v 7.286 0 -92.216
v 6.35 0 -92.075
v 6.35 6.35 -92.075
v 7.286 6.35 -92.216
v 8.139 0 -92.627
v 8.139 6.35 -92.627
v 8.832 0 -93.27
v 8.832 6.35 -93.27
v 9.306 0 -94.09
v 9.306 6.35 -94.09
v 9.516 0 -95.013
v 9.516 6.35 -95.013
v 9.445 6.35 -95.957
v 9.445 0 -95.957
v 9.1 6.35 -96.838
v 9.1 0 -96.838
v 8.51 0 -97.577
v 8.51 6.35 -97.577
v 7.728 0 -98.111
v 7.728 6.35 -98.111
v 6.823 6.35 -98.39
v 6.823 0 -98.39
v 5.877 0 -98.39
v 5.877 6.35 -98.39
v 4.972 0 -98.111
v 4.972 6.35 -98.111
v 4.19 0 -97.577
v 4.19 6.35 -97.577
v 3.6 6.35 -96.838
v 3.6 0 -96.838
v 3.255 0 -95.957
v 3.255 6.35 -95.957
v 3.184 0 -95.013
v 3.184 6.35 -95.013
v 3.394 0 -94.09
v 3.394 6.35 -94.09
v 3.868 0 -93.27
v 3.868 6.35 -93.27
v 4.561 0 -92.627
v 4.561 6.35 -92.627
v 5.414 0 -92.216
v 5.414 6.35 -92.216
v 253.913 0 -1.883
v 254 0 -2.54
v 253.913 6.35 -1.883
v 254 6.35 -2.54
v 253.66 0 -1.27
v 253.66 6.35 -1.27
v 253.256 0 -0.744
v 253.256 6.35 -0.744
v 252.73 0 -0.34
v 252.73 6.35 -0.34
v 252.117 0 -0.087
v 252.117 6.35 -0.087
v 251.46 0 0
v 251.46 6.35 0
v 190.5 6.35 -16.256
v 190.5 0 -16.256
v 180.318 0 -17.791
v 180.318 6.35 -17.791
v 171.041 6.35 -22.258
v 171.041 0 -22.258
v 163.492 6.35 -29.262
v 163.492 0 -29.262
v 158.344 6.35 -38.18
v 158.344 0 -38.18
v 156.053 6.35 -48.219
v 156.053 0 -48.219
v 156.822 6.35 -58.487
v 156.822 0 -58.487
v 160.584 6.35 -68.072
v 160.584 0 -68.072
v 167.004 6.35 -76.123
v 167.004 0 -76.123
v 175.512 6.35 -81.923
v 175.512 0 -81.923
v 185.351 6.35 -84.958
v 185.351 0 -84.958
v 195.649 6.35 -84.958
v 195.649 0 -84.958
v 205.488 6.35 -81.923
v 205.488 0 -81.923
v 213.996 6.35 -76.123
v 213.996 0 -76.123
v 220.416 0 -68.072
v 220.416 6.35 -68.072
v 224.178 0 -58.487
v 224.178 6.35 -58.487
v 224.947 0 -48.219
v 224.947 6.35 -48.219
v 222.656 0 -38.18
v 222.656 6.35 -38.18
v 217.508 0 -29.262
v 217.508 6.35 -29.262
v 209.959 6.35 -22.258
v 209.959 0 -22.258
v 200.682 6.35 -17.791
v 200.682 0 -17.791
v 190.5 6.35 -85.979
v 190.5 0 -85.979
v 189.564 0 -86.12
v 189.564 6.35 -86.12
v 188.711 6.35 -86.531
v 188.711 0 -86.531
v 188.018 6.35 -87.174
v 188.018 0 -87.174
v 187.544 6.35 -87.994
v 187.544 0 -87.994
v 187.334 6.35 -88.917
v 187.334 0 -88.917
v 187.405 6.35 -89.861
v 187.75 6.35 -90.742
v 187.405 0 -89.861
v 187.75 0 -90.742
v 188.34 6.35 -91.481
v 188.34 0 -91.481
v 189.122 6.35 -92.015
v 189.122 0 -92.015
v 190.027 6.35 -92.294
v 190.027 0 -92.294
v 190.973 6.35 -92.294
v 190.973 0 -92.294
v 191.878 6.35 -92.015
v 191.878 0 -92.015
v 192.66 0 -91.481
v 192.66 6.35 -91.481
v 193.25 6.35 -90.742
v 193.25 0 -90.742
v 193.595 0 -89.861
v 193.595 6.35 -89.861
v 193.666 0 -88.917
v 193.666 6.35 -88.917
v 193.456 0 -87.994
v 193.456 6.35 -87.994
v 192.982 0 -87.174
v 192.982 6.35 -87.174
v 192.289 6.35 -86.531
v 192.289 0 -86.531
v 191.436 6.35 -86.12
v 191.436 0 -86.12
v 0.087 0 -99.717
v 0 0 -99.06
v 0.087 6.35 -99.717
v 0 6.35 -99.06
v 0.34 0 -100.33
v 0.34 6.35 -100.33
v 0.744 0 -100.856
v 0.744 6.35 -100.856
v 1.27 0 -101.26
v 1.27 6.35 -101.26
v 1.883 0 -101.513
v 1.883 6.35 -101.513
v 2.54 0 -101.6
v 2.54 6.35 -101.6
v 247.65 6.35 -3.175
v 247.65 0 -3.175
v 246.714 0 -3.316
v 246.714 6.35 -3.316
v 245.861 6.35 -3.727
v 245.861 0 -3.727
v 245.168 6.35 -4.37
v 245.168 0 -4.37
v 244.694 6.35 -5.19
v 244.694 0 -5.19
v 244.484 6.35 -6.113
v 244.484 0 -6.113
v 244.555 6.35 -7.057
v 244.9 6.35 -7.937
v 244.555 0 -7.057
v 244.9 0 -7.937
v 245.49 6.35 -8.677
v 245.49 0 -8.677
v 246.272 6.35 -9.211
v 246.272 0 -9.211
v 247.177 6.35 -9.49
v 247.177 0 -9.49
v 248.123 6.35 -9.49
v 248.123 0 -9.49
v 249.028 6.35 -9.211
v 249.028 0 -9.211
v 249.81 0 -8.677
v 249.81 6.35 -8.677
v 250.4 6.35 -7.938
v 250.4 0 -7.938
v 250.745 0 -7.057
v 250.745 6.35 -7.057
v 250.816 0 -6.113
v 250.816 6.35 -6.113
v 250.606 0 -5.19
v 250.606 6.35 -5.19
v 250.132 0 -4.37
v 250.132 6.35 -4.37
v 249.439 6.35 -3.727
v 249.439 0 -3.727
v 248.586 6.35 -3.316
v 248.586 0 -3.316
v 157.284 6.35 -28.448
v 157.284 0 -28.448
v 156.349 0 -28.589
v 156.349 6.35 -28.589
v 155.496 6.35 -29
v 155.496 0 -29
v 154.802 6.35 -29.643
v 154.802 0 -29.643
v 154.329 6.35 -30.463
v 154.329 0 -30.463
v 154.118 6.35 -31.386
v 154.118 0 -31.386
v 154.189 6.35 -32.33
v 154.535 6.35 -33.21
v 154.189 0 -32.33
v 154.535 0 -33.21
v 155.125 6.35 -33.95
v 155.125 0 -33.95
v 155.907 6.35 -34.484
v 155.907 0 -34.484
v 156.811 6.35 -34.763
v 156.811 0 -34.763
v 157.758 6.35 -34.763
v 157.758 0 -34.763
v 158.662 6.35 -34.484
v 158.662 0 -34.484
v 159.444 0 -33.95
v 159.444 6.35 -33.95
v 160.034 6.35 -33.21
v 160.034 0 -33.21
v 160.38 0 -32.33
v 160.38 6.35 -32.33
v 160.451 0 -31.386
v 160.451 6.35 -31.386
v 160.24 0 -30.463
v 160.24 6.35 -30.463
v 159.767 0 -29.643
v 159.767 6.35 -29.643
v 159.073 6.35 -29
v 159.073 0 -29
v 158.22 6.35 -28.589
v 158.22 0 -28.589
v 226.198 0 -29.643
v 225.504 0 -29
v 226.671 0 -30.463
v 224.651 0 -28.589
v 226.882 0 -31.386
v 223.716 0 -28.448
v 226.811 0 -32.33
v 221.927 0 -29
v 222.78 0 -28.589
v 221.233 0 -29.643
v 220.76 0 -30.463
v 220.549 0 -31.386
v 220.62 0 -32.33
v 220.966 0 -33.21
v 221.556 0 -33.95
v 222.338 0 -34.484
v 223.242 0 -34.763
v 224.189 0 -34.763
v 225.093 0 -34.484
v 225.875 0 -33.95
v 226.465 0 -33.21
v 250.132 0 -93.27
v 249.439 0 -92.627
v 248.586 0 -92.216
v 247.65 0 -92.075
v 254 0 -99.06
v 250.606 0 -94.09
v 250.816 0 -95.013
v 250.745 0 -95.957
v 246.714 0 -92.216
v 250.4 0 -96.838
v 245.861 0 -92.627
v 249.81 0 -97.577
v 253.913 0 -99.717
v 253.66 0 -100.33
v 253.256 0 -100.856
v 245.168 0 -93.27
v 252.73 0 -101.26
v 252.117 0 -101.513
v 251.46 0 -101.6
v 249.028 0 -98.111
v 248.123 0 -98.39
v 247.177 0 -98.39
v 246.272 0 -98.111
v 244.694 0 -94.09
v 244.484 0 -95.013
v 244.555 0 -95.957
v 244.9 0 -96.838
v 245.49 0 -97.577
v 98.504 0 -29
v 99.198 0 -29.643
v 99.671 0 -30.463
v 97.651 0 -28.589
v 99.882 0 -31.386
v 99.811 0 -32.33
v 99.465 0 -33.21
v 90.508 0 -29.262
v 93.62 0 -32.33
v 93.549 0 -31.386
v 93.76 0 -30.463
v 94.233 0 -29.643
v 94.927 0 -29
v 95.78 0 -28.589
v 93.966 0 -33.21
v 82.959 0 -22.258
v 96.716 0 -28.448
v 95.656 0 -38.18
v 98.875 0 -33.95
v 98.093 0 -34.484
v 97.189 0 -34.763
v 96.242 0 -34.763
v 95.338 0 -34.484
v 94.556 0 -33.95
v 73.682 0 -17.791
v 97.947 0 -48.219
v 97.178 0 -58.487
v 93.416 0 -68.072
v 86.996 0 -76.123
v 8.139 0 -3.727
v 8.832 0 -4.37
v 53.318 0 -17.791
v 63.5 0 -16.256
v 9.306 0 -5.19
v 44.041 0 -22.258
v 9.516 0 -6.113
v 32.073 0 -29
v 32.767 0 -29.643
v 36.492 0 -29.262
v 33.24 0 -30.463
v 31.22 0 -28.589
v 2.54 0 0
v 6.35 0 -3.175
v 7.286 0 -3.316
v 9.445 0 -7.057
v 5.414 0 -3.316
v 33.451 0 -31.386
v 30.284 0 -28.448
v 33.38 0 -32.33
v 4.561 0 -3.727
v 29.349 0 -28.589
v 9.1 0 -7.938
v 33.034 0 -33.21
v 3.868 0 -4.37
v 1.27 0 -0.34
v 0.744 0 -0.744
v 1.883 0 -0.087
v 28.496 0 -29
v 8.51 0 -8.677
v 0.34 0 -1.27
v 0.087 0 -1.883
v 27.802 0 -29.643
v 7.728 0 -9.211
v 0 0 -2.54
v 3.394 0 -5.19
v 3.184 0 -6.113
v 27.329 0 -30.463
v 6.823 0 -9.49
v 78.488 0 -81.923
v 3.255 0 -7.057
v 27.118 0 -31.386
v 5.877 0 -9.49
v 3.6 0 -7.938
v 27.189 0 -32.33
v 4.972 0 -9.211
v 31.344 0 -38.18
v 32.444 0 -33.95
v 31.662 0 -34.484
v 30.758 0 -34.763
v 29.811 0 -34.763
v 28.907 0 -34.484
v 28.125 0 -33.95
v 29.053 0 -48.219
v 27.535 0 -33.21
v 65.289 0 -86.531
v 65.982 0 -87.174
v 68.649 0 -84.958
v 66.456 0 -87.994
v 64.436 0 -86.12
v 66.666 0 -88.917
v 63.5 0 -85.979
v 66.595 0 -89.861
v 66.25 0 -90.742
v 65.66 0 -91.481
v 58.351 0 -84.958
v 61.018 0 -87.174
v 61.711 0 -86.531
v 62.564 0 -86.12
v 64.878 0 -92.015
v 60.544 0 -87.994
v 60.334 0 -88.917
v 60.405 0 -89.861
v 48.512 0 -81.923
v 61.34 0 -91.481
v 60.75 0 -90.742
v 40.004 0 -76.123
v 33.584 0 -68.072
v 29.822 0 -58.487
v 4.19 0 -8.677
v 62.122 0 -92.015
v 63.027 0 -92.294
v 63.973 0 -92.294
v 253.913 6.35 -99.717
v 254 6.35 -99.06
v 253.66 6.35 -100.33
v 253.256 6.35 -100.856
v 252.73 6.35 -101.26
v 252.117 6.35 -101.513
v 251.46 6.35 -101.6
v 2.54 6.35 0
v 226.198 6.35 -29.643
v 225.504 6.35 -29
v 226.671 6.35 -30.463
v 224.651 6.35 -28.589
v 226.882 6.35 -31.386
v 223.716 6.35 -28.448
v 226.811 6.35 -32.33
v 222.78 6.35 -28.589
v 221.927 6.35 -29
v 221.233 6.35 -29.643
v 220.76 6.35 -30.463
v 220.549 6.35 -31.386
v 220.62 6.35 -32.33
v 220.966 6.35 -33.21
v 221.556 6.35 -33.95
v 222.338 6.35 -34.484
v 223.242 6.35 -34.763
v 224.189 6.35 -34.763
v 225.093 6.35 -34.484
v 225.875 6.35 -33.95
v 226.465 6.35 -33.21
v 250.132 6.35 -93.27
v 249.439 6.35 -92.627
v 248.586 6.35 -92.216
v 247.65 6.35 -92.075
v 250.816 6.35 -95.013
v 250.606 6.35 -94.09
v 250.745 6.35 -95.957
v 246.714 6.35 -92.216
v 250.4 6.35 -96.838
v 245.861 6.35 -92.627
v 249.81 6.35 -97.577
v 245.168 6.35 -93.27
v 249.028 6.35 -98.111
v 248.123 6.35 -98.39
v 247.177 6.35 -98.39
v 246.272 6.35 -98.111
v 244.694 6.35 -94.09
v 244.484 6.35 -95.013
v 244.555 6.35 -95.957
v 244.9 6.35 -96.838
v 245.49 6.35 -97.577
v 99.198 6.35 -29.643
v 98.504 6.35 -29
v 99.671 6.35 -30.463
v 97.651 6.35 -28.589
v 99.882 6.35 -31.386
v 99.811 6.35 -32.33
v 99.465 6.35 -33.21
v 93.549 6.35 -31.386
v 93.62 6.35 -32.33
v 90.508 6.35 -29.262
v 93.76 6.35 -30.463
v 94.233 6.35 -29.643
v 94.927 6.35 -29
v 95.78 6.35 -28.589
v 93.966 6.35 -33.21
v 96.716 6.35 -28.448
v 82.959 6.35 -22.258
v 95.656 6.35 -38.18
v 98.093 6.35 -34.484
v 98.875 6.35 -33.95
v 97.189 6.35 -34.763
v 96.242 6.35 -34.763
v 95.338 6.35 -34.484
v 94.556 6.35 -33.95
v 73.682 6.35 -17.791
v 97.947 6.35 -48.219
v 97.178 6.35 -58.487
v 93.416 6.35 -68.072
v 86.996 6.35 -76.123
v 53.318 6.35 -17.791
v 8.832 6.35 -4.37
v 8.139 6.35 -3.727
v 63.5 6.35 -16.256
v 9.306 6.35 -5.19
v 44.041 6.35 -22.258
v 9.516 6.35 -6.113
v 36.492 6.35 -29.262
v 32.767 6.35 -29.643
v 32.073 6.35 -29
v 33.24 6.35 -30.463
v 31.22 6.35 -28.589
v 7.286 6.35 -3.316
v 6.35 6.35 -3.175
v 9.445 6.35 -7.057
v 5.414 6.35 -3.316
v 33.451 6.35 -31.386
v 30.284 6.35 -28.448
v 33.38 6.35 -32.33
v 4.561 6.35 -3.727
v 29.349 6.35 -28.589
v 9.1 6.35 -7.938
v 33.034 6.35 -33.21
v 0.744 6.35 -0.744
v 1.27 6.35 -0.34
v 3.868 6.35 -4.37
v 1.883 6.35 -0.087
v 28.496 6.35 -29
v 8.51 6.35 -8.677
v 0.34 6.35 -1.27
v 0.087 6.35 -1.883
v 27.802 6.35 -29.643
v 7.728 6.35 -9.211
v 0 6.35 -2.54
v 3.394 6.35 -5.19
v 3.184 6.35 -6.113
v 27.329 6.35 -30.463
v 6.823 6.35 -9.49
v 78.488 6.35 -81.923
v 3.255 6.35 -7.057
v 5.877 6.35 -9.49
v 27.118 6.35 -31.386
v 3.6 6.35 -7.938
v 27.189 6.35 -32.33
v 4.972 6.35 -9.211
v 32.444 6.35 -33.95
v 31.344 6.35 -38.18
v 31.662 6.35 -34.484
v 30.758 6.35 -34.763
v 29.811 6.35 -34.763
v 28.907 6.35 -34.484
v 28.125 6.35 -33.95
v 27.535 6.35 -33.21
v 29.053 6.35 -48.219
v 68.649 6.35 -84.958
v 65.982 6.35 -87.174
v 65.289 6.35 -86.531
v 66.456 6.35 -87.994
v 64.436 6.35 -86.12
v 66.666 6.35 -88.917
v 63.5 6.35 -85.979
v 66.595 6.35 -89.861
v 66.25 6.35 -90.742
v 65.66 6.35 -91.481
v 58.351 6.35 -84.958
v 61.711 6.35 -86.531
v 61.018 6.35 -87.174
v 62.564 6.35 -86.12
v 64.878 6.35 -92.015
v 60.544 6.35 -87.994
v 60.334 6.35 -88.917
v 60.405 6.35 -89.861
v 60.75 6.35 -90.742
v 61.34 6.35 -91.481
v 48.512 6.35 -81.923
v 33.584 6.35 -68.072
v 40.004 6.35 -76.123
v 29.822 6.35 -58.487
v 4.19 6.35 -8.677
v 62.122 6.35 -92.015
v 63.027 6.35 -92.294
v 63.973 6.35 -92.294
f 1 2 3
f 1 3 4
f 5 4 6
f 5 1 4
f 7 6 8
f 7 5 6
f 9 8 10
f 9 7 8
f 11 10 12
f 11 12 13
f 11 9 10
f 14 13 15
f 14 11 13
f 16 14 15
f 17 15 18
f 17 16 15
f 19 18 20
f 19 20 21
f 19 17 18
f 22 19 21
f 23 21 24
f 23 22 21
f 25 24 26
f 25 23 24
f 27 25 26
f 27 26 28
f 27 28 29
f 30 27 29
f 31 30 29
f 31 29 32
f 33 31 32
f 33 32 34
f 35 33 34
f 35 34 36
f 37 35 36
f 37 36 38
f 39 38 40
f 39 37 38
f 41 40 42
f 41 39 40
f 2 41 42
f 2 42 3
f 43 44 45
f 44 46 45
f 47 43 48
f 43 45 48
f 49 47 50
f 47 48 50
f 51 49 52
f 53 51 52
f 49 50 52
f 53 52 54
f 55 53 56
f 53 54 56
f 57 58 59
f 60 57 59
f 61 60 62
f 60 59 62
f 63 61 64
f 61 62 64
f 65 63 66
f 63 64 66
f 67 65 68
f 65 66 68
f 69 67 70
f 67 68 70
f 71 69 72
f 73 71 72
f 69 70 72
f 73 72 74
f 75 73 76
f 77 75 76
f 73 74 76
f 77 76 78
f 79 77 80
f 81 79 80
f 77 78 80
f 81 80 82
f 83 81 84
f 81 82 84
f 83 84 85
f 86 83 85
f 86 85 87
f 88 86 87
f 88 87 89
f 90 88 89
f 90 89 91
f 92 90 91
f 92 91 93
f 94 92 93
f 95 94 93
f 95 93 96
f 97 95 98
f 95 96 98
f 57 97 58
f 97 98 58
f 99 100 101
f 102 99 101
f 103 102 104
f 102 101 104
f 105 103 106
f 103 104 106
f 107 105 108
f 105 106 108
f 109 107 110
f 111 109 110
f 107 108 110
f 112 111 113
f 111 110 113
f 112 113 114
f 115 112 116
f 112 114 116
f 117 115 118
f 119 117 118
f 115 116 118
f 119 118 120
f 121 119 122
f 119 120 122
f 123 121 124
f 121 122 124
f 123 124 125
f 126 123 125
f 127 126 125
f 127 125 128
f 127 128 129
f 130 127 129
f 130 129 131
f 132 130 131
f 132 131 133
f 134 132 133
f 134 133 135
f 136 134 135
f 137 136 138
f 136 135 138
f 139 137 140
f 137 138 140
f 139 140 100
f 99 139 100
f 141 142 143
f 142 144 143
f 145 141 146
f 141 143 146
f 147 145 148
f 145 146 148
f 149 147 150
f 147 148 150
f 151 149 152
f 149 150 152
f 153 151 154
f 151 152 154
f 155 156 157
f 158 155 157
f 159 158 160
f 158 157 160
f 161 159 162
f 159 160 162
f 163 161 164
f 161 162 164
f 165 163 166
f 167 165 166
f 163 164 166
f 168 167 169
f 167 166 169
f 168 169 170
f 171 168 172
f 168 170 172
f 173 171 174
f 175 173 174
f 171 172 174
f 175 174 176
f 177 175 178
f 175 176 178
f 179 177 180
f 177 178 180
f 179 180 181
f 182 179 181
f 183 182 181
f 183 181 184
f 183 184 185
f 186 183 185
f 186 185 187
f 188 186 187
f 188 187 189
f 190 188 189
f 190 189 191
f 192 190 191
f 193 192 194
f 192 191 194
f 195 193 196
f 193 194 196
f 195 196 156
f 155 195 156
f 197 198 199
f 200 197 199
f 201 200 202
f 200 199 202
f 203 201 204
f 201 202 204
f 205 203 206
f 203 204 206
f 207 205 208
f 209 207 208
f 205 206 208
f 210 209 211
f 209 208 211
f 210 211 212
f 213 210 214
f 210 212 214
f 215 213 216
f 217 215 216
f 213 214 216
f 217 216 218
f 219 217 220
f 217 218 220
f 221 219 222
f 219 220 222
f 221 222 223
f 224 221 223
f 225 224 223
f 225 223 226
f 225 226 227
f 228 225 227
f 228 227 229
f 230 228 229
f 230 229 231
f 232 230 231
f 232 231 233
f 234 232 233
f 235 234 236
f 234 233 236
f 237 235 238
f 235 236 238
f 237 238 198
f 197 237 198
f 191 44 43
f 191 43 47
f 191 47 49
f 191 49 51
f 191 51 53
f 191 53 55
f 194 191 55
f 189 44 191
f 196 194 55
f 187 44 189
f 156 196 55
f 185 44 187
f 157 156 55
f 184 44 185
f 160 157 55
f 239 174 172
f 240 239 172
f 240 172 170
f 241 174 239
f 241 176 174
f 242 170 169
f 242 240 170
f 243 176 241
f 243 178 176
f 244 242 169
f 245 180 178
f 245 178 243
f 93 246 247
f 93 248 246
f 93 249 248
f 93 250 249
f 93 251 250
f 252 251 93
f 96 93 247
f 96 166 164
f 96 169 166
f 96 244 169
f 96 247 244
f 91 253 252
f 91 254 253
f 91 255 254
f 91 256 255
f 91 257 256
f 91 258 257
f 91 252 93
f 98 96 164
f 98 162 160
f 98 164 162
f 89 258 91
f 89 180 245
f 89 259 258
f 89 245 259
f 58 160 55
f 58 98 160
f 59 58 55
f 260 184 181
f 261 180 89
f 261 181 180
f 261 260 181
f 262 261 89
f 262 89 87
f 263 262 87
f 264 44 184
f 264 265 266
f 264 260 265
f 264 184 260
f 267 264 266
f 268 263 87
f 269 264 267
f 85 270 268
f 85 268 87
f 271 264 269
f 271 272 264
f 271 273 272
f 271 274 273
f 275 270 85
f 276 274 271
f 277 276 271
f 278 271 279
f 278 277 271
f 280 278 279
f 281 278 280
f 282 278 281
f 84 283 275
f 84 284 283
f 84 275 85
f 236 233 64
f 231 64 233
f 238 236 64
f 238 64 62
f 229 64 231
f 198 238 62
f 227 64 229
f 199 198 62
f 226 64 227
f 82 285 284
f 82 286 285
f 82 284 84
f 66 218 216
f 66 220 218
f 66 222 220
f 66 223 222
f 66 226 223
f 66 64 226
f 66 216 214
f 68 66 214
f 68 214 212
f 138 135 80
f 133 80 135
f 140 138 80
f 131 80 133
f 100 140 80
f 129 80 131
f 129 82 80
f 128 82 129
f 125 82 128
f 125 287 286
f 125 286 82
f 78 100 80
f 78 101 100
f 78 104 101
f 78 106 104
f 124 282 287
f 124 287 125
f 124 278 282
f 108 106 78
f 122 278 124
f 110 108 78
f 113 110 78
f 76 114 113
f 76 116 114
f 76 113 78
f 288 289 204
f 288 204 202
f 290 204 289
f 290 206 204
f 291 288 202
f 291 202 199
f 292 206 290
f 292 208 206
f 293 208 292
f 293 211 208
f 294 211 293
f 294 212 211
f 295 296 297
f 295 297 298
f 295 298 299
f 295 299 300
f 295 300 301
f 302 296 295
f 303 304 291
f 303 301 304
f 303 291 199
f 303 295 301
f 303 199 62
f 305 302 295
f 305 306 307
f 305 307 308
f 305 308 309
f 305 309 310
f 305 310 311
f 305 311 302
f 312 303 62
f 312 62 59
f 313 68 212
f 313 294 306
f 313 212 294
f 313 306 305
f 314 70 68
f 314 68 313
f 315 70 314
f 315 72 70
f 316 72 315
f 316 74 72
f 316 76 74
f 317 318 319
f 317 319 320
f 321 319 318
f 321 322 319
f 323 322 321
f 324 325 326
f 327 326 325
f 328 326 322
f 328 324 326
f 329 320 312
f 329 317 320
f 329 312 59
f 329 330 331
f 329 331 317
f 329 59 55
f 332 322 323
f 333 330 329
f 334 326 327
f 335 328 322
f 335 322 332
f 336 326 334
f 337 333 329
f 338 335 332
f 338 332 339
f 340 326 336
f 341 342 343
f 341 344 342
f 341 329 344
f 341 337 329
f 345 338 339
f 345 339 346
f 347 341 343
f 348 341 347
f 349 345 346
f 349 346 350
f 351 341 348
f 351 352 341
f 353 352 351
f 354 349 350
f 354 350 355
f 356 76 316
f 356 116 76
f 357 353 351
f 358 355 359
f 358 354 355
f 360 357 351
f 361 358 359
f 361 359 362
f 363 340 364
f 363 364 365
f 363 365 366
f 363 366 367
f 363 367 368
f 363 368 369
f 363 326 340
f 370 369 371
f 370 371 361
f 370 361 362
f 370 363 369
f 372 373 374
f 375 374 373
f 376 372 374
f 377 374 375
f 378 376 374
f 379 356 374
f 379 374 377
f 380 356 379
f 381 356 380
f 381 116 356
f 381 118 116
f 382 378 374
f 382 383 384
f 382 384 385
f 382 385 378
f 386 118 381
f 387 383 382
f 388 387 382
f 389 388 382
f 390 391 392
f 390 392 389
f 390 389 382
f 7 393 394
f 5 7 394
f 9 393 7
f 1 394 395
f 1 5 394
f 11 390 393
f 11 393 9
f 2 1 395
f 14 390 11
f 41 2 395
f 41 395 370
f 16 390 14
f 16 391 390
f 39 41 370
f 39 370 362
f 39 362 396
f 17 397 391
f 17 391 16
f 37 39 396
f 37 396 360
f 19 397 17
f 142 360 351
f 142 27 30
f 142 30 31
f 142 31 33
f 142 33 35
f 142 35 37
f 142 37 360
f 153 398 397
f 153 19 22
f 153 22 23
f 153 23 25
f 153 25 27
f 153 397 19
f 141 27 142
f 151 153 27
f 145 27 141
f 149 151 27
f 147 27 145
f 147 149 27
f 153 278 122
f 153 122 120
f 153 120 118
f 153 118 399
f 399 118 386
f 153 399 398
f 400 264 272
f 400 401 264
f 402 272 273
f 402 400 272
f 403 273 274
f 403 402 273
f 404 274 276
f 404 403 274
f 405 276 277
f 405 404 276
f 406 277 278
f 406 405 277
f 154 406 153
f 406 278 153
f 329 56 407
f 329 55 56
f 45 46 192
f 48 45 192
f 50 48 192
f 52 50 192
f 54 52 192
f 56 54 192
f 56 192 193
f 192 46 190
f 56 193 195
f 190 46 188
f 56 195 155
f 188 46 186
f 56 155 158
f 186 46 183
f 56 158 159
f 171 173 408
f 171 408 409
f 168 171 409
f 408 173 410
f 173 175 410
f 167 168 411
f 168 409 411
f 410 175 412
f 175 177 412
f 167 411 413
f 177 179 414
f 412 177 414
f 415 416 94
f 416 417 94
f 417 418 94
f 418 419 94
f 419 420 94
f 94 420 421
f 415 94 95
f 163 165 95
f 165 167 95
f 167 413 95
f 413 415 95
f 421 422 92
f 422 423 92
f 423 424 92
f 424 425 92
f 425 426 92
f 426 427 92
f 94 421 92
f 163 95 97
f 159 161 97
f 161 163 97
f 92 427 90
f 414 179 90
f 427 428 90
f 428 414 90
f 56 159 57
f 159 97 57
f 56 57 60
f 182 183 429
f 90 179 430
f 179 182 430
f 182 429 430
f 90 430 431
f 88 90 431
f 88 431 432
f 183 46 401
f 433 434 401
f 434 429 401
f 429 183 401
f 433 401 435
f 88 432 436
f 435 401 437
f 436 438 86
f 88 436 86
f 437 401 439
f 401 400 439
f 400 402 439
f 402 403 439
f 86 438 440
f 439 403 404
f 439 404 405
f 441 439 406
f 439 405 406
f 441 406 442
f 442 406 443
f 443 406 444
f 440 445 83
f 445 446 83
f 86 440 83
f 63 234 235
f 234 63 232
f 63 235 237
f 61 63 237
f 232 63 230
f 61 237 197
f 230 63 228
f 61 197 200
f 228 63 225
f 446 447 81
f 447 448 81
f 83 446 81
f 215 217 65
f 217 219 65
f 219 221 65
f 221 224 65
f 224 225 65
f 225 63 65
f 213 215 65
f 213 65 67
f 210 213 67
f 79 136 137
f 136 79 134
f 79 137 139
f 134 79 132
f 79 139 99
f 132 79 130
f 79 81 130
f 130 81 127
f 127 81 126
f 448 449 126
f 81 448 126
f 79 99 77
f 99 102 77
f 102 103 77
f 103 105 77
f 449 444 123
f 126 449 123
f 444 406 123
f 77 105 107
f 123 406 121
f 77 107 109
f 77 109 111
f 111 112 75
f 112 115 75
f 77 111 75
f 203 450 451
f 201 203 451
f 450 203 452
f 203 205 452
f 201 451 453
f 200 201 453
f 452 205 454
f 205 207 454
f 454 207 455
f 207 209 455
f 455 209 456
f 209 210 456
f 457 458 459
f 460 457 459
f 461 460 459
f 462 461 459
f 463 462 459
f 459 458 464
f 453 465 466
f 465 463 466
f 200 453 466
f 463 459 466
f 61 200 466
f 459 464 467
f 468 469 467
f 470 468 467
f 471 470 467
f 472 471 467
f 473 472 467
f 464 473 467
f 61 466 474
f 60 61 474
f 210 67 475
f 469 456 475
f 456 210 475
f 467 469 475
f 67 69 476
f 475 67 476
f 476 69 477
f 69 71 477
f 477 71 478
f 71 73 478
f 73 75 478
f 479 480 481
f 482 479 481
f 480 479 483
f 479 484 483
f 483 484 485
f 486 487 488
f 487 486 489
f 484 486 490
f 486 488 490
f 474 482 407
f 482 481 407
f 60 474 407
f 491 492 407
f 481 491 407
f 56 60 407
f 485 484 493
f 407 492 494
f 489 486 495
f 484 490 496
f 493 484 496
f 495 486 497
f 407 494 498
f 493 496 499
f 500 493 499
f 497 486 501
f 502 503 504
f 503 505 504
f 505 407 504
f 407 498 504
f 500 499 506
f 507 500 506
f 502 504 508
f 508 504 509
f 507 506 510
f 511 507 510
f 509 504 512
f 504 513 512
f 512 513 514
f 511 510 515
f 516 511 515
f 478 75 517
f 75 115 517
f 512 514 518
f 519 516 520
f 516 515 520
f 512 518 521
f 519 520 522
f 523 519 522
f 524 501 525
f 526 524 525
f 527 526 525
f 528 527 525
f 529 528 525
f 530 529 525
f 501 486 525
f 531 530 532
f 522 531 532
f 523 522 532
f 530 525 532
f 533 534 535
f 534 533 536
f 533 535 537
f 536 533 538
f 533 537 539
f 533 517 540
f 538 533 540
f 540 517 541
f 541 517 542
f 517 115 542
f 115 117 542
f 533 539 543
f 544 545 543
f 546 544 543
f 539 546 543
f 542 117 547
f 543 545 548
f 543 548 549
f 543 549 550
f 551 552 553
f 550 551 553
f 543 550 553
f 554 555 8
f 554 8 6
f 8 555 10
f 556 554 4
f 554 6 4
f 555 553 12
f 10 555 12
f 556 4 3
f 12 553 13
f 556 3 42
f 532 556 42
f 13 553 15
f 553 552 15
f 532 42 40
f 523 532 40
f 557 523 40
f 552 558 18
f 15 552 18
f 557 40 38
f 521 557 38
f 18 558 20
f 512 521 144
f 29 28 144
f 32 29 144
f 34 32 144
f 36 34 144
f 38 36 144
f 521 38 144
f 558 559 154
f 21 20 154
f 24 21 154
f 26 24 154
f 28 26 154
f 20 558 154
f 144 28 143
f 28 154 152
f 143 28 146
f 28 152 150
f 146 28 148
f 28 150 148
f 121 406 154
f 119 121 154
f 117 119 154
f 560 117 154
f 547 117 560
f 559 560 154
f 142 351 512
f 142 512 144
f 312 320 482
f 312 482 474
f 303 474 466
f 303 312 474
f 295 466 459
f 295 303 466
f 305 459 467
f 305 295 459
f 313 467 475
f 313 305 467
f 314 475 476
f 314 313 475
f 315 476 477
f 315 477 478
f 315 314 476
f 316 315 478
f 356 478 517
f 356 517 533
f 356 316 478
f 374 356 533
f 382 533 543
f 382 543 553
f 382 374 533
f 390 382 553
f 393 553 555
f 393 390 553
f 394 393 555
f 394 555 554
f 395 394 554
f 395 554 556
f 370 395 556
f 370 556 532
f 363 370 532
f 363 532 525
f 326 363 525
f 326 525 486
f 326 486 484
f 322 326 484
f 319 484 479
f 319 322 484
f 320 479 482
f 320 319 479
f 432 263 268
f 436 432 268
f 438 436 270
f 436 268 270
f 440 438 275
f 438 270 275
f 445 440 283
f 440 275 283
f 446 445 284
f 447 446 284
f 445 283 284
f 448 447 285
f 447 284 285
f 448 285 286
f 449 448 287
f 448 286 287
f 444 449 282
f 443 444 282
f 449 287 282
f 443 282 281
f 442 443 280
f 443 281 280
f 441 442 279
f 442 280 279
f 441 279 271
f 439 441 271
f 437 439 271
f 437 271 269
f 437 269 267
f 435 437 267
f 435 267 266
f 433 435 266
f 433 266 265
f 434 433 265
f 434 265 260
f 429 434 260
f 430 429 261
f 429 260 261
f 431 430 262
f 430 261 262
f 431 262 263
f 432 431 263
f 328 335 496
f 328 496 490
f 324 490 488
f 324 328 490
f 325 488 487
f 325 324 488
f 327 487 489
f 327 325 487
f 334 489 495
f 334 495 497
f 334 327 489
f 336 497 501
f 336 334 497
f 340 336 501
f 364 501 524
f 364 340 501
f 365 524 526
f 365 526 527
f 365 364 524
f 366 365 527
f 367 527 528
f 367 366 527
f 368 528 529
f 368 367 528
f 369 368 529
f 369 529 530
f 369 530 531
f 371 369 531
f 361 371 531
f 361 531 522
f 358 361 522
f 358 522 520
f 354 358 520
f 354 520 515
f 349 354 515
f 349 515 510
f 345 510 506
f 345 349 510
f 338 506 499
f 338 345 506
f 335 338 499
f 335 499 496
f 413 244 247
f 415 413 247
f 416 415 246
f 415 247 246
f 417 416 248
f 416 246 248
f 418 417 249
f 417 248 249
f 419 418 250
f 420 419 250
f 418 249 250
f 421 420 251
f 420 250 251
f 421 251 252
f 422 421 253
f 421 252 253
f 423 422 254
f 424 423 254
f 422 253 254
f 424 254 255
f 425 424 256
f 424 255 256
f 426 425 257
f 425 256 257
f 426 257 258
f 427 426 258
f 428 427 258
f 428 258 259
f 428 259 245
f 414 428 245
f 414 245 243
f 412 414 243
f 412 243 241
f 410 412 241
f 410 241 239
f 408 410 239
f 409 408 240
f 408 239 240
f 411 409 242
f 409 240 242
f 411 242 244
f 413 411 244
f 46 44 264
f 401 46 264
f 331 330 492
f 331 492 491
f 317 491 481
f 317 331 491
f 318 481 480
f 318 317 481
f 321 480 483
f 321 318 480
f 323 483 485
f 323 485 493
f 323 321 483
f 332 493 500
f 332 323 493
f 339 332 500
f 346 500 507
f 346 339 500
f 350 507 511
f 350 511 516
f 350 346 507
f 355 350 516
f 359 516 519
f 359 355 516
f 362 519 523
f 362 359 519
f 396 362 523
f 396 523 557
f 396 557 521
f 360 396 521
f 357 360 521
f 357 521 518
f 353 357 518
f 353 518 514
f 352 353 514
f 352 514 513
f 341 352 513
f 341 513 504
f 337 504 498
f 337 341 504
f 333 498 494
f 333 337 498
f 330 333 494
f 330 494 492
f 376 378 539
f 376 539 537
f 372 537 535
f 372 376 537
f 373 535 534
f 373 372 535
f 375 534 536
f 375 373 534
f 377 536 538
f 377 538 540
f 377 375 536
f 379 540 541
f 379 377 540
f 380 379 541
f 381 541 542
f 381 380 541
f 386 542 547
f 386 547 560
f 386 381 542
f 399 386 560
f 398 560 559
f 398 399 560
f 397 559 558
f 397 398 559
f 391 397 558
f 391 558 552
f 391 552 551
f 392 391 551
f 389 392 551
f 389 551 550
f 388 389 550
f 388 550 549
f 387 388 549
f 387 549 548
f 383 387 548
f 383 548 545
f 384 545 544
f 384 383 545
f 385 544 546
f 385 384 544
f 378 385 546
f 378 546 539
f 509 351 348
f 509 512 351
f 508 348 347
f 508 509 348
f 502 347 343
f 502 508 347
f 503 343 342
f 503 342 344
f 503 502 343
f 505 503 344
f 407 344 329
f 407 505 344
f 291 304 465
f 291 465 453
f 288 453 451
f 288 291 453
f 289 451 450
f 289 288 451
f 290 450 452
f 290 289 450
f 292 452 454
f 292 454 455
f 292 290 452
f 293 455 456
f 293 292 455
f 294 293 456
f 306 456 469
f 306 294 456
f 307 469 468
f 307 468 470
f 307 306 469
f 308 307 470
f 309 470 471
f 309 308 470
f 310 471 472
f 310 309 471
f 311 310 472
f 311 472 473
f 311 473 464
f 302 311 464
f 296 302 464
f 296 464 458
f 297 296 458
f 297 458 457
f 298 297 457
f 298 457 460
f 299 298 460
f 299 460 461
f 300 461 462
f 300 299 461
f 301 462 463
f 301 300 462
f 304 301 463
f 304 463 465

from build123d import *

# Parameters (mm, degrees)
SKETCH1_W            = 127
SKETCH1_H            = 101.6
SKETCH1_R            = 34.544
SKETCH1_R_2          = 3.175
BOSS_EXTRUDE1_DEPTH  = 6.35
FILLET1_R            = 2.54
FILLET1_OF_MIRROR1_R = 2.54


with BuildPart() as part:
    # Sketch1 → Boss-Extrude1 (new body)
    with BuildSketch(Plane(origin=(0, 0, 0), x_dir=(1, 0, 0), z_dir=(0, 1, 0))):
        with Locations((63.5, 50.8)):
            Rectangle(SKETCH1_W, SKETCH1_H)
        with Locations(Location((63.5, 50.8, 0), (0, 0, 270))):
            Circle(SKETCH1_R, mode=Mode.SUBTRACT)
        with Locations(Location((6.35, 95.25, 0), (0, 0, 270))):
            Circle(SKETCH1_R_2, mode=Mode.SUBTRACT)
        with Locations(Location((6.35, 6.35, 0), (0, 0, 270))):
            Circle(SKETCH1_R_2, mode=Mode.SUBTRACT)
        with Locations(Location((63.5, 89.154, 0), (0, 0, 270))):
            Circle(SKETCH1_R_2, mode=Mode.SUBTRACT)
        with Locations(Location((96.715538337, 31.623, 0), (0, 0, 270))):
            Circle(SKETCH1_R_2, mode=Mode.SUBTRACT)
        with Locations(Location((30.284461663, 31.623, 0), (0, 0, 270))):
            Circle(SKETCH1_R_2, mode=Mode.SUBTRACT)
    boss_extrude1 = extrude(amount=BOSS_EXTRUDE1_DEPTH)

    # Fillet1
    fillet1_edges = [part.edges().sort_by_distance(p)[0] for p in [
        (0, 3.175, -101.6),
        (0, 3.175, 0),
    ]]
    fillet(fillet1_edges, radius=FILLET1_R)

    # Mirror1: Boss-Extrude1 across plane
    add(boss_extrude1.mirror(Plane(origin=(127, 6.35, 0), x_dir=(0, 0, 1), z_dir=(-1, 0, 0))))

    # Fillet1 of Mirror1
    fillet1_of_mirror1_edges = [part.edges().sort_by_distance(p)[0] for p in [
        (254, 3.175, -101.6),
        (254, 3.175, 0),
    ]]
    fillet(fillet1_of_mirror1_edges, radius=FILLET1_OF_MIRROR1_R)


solid = part.part
